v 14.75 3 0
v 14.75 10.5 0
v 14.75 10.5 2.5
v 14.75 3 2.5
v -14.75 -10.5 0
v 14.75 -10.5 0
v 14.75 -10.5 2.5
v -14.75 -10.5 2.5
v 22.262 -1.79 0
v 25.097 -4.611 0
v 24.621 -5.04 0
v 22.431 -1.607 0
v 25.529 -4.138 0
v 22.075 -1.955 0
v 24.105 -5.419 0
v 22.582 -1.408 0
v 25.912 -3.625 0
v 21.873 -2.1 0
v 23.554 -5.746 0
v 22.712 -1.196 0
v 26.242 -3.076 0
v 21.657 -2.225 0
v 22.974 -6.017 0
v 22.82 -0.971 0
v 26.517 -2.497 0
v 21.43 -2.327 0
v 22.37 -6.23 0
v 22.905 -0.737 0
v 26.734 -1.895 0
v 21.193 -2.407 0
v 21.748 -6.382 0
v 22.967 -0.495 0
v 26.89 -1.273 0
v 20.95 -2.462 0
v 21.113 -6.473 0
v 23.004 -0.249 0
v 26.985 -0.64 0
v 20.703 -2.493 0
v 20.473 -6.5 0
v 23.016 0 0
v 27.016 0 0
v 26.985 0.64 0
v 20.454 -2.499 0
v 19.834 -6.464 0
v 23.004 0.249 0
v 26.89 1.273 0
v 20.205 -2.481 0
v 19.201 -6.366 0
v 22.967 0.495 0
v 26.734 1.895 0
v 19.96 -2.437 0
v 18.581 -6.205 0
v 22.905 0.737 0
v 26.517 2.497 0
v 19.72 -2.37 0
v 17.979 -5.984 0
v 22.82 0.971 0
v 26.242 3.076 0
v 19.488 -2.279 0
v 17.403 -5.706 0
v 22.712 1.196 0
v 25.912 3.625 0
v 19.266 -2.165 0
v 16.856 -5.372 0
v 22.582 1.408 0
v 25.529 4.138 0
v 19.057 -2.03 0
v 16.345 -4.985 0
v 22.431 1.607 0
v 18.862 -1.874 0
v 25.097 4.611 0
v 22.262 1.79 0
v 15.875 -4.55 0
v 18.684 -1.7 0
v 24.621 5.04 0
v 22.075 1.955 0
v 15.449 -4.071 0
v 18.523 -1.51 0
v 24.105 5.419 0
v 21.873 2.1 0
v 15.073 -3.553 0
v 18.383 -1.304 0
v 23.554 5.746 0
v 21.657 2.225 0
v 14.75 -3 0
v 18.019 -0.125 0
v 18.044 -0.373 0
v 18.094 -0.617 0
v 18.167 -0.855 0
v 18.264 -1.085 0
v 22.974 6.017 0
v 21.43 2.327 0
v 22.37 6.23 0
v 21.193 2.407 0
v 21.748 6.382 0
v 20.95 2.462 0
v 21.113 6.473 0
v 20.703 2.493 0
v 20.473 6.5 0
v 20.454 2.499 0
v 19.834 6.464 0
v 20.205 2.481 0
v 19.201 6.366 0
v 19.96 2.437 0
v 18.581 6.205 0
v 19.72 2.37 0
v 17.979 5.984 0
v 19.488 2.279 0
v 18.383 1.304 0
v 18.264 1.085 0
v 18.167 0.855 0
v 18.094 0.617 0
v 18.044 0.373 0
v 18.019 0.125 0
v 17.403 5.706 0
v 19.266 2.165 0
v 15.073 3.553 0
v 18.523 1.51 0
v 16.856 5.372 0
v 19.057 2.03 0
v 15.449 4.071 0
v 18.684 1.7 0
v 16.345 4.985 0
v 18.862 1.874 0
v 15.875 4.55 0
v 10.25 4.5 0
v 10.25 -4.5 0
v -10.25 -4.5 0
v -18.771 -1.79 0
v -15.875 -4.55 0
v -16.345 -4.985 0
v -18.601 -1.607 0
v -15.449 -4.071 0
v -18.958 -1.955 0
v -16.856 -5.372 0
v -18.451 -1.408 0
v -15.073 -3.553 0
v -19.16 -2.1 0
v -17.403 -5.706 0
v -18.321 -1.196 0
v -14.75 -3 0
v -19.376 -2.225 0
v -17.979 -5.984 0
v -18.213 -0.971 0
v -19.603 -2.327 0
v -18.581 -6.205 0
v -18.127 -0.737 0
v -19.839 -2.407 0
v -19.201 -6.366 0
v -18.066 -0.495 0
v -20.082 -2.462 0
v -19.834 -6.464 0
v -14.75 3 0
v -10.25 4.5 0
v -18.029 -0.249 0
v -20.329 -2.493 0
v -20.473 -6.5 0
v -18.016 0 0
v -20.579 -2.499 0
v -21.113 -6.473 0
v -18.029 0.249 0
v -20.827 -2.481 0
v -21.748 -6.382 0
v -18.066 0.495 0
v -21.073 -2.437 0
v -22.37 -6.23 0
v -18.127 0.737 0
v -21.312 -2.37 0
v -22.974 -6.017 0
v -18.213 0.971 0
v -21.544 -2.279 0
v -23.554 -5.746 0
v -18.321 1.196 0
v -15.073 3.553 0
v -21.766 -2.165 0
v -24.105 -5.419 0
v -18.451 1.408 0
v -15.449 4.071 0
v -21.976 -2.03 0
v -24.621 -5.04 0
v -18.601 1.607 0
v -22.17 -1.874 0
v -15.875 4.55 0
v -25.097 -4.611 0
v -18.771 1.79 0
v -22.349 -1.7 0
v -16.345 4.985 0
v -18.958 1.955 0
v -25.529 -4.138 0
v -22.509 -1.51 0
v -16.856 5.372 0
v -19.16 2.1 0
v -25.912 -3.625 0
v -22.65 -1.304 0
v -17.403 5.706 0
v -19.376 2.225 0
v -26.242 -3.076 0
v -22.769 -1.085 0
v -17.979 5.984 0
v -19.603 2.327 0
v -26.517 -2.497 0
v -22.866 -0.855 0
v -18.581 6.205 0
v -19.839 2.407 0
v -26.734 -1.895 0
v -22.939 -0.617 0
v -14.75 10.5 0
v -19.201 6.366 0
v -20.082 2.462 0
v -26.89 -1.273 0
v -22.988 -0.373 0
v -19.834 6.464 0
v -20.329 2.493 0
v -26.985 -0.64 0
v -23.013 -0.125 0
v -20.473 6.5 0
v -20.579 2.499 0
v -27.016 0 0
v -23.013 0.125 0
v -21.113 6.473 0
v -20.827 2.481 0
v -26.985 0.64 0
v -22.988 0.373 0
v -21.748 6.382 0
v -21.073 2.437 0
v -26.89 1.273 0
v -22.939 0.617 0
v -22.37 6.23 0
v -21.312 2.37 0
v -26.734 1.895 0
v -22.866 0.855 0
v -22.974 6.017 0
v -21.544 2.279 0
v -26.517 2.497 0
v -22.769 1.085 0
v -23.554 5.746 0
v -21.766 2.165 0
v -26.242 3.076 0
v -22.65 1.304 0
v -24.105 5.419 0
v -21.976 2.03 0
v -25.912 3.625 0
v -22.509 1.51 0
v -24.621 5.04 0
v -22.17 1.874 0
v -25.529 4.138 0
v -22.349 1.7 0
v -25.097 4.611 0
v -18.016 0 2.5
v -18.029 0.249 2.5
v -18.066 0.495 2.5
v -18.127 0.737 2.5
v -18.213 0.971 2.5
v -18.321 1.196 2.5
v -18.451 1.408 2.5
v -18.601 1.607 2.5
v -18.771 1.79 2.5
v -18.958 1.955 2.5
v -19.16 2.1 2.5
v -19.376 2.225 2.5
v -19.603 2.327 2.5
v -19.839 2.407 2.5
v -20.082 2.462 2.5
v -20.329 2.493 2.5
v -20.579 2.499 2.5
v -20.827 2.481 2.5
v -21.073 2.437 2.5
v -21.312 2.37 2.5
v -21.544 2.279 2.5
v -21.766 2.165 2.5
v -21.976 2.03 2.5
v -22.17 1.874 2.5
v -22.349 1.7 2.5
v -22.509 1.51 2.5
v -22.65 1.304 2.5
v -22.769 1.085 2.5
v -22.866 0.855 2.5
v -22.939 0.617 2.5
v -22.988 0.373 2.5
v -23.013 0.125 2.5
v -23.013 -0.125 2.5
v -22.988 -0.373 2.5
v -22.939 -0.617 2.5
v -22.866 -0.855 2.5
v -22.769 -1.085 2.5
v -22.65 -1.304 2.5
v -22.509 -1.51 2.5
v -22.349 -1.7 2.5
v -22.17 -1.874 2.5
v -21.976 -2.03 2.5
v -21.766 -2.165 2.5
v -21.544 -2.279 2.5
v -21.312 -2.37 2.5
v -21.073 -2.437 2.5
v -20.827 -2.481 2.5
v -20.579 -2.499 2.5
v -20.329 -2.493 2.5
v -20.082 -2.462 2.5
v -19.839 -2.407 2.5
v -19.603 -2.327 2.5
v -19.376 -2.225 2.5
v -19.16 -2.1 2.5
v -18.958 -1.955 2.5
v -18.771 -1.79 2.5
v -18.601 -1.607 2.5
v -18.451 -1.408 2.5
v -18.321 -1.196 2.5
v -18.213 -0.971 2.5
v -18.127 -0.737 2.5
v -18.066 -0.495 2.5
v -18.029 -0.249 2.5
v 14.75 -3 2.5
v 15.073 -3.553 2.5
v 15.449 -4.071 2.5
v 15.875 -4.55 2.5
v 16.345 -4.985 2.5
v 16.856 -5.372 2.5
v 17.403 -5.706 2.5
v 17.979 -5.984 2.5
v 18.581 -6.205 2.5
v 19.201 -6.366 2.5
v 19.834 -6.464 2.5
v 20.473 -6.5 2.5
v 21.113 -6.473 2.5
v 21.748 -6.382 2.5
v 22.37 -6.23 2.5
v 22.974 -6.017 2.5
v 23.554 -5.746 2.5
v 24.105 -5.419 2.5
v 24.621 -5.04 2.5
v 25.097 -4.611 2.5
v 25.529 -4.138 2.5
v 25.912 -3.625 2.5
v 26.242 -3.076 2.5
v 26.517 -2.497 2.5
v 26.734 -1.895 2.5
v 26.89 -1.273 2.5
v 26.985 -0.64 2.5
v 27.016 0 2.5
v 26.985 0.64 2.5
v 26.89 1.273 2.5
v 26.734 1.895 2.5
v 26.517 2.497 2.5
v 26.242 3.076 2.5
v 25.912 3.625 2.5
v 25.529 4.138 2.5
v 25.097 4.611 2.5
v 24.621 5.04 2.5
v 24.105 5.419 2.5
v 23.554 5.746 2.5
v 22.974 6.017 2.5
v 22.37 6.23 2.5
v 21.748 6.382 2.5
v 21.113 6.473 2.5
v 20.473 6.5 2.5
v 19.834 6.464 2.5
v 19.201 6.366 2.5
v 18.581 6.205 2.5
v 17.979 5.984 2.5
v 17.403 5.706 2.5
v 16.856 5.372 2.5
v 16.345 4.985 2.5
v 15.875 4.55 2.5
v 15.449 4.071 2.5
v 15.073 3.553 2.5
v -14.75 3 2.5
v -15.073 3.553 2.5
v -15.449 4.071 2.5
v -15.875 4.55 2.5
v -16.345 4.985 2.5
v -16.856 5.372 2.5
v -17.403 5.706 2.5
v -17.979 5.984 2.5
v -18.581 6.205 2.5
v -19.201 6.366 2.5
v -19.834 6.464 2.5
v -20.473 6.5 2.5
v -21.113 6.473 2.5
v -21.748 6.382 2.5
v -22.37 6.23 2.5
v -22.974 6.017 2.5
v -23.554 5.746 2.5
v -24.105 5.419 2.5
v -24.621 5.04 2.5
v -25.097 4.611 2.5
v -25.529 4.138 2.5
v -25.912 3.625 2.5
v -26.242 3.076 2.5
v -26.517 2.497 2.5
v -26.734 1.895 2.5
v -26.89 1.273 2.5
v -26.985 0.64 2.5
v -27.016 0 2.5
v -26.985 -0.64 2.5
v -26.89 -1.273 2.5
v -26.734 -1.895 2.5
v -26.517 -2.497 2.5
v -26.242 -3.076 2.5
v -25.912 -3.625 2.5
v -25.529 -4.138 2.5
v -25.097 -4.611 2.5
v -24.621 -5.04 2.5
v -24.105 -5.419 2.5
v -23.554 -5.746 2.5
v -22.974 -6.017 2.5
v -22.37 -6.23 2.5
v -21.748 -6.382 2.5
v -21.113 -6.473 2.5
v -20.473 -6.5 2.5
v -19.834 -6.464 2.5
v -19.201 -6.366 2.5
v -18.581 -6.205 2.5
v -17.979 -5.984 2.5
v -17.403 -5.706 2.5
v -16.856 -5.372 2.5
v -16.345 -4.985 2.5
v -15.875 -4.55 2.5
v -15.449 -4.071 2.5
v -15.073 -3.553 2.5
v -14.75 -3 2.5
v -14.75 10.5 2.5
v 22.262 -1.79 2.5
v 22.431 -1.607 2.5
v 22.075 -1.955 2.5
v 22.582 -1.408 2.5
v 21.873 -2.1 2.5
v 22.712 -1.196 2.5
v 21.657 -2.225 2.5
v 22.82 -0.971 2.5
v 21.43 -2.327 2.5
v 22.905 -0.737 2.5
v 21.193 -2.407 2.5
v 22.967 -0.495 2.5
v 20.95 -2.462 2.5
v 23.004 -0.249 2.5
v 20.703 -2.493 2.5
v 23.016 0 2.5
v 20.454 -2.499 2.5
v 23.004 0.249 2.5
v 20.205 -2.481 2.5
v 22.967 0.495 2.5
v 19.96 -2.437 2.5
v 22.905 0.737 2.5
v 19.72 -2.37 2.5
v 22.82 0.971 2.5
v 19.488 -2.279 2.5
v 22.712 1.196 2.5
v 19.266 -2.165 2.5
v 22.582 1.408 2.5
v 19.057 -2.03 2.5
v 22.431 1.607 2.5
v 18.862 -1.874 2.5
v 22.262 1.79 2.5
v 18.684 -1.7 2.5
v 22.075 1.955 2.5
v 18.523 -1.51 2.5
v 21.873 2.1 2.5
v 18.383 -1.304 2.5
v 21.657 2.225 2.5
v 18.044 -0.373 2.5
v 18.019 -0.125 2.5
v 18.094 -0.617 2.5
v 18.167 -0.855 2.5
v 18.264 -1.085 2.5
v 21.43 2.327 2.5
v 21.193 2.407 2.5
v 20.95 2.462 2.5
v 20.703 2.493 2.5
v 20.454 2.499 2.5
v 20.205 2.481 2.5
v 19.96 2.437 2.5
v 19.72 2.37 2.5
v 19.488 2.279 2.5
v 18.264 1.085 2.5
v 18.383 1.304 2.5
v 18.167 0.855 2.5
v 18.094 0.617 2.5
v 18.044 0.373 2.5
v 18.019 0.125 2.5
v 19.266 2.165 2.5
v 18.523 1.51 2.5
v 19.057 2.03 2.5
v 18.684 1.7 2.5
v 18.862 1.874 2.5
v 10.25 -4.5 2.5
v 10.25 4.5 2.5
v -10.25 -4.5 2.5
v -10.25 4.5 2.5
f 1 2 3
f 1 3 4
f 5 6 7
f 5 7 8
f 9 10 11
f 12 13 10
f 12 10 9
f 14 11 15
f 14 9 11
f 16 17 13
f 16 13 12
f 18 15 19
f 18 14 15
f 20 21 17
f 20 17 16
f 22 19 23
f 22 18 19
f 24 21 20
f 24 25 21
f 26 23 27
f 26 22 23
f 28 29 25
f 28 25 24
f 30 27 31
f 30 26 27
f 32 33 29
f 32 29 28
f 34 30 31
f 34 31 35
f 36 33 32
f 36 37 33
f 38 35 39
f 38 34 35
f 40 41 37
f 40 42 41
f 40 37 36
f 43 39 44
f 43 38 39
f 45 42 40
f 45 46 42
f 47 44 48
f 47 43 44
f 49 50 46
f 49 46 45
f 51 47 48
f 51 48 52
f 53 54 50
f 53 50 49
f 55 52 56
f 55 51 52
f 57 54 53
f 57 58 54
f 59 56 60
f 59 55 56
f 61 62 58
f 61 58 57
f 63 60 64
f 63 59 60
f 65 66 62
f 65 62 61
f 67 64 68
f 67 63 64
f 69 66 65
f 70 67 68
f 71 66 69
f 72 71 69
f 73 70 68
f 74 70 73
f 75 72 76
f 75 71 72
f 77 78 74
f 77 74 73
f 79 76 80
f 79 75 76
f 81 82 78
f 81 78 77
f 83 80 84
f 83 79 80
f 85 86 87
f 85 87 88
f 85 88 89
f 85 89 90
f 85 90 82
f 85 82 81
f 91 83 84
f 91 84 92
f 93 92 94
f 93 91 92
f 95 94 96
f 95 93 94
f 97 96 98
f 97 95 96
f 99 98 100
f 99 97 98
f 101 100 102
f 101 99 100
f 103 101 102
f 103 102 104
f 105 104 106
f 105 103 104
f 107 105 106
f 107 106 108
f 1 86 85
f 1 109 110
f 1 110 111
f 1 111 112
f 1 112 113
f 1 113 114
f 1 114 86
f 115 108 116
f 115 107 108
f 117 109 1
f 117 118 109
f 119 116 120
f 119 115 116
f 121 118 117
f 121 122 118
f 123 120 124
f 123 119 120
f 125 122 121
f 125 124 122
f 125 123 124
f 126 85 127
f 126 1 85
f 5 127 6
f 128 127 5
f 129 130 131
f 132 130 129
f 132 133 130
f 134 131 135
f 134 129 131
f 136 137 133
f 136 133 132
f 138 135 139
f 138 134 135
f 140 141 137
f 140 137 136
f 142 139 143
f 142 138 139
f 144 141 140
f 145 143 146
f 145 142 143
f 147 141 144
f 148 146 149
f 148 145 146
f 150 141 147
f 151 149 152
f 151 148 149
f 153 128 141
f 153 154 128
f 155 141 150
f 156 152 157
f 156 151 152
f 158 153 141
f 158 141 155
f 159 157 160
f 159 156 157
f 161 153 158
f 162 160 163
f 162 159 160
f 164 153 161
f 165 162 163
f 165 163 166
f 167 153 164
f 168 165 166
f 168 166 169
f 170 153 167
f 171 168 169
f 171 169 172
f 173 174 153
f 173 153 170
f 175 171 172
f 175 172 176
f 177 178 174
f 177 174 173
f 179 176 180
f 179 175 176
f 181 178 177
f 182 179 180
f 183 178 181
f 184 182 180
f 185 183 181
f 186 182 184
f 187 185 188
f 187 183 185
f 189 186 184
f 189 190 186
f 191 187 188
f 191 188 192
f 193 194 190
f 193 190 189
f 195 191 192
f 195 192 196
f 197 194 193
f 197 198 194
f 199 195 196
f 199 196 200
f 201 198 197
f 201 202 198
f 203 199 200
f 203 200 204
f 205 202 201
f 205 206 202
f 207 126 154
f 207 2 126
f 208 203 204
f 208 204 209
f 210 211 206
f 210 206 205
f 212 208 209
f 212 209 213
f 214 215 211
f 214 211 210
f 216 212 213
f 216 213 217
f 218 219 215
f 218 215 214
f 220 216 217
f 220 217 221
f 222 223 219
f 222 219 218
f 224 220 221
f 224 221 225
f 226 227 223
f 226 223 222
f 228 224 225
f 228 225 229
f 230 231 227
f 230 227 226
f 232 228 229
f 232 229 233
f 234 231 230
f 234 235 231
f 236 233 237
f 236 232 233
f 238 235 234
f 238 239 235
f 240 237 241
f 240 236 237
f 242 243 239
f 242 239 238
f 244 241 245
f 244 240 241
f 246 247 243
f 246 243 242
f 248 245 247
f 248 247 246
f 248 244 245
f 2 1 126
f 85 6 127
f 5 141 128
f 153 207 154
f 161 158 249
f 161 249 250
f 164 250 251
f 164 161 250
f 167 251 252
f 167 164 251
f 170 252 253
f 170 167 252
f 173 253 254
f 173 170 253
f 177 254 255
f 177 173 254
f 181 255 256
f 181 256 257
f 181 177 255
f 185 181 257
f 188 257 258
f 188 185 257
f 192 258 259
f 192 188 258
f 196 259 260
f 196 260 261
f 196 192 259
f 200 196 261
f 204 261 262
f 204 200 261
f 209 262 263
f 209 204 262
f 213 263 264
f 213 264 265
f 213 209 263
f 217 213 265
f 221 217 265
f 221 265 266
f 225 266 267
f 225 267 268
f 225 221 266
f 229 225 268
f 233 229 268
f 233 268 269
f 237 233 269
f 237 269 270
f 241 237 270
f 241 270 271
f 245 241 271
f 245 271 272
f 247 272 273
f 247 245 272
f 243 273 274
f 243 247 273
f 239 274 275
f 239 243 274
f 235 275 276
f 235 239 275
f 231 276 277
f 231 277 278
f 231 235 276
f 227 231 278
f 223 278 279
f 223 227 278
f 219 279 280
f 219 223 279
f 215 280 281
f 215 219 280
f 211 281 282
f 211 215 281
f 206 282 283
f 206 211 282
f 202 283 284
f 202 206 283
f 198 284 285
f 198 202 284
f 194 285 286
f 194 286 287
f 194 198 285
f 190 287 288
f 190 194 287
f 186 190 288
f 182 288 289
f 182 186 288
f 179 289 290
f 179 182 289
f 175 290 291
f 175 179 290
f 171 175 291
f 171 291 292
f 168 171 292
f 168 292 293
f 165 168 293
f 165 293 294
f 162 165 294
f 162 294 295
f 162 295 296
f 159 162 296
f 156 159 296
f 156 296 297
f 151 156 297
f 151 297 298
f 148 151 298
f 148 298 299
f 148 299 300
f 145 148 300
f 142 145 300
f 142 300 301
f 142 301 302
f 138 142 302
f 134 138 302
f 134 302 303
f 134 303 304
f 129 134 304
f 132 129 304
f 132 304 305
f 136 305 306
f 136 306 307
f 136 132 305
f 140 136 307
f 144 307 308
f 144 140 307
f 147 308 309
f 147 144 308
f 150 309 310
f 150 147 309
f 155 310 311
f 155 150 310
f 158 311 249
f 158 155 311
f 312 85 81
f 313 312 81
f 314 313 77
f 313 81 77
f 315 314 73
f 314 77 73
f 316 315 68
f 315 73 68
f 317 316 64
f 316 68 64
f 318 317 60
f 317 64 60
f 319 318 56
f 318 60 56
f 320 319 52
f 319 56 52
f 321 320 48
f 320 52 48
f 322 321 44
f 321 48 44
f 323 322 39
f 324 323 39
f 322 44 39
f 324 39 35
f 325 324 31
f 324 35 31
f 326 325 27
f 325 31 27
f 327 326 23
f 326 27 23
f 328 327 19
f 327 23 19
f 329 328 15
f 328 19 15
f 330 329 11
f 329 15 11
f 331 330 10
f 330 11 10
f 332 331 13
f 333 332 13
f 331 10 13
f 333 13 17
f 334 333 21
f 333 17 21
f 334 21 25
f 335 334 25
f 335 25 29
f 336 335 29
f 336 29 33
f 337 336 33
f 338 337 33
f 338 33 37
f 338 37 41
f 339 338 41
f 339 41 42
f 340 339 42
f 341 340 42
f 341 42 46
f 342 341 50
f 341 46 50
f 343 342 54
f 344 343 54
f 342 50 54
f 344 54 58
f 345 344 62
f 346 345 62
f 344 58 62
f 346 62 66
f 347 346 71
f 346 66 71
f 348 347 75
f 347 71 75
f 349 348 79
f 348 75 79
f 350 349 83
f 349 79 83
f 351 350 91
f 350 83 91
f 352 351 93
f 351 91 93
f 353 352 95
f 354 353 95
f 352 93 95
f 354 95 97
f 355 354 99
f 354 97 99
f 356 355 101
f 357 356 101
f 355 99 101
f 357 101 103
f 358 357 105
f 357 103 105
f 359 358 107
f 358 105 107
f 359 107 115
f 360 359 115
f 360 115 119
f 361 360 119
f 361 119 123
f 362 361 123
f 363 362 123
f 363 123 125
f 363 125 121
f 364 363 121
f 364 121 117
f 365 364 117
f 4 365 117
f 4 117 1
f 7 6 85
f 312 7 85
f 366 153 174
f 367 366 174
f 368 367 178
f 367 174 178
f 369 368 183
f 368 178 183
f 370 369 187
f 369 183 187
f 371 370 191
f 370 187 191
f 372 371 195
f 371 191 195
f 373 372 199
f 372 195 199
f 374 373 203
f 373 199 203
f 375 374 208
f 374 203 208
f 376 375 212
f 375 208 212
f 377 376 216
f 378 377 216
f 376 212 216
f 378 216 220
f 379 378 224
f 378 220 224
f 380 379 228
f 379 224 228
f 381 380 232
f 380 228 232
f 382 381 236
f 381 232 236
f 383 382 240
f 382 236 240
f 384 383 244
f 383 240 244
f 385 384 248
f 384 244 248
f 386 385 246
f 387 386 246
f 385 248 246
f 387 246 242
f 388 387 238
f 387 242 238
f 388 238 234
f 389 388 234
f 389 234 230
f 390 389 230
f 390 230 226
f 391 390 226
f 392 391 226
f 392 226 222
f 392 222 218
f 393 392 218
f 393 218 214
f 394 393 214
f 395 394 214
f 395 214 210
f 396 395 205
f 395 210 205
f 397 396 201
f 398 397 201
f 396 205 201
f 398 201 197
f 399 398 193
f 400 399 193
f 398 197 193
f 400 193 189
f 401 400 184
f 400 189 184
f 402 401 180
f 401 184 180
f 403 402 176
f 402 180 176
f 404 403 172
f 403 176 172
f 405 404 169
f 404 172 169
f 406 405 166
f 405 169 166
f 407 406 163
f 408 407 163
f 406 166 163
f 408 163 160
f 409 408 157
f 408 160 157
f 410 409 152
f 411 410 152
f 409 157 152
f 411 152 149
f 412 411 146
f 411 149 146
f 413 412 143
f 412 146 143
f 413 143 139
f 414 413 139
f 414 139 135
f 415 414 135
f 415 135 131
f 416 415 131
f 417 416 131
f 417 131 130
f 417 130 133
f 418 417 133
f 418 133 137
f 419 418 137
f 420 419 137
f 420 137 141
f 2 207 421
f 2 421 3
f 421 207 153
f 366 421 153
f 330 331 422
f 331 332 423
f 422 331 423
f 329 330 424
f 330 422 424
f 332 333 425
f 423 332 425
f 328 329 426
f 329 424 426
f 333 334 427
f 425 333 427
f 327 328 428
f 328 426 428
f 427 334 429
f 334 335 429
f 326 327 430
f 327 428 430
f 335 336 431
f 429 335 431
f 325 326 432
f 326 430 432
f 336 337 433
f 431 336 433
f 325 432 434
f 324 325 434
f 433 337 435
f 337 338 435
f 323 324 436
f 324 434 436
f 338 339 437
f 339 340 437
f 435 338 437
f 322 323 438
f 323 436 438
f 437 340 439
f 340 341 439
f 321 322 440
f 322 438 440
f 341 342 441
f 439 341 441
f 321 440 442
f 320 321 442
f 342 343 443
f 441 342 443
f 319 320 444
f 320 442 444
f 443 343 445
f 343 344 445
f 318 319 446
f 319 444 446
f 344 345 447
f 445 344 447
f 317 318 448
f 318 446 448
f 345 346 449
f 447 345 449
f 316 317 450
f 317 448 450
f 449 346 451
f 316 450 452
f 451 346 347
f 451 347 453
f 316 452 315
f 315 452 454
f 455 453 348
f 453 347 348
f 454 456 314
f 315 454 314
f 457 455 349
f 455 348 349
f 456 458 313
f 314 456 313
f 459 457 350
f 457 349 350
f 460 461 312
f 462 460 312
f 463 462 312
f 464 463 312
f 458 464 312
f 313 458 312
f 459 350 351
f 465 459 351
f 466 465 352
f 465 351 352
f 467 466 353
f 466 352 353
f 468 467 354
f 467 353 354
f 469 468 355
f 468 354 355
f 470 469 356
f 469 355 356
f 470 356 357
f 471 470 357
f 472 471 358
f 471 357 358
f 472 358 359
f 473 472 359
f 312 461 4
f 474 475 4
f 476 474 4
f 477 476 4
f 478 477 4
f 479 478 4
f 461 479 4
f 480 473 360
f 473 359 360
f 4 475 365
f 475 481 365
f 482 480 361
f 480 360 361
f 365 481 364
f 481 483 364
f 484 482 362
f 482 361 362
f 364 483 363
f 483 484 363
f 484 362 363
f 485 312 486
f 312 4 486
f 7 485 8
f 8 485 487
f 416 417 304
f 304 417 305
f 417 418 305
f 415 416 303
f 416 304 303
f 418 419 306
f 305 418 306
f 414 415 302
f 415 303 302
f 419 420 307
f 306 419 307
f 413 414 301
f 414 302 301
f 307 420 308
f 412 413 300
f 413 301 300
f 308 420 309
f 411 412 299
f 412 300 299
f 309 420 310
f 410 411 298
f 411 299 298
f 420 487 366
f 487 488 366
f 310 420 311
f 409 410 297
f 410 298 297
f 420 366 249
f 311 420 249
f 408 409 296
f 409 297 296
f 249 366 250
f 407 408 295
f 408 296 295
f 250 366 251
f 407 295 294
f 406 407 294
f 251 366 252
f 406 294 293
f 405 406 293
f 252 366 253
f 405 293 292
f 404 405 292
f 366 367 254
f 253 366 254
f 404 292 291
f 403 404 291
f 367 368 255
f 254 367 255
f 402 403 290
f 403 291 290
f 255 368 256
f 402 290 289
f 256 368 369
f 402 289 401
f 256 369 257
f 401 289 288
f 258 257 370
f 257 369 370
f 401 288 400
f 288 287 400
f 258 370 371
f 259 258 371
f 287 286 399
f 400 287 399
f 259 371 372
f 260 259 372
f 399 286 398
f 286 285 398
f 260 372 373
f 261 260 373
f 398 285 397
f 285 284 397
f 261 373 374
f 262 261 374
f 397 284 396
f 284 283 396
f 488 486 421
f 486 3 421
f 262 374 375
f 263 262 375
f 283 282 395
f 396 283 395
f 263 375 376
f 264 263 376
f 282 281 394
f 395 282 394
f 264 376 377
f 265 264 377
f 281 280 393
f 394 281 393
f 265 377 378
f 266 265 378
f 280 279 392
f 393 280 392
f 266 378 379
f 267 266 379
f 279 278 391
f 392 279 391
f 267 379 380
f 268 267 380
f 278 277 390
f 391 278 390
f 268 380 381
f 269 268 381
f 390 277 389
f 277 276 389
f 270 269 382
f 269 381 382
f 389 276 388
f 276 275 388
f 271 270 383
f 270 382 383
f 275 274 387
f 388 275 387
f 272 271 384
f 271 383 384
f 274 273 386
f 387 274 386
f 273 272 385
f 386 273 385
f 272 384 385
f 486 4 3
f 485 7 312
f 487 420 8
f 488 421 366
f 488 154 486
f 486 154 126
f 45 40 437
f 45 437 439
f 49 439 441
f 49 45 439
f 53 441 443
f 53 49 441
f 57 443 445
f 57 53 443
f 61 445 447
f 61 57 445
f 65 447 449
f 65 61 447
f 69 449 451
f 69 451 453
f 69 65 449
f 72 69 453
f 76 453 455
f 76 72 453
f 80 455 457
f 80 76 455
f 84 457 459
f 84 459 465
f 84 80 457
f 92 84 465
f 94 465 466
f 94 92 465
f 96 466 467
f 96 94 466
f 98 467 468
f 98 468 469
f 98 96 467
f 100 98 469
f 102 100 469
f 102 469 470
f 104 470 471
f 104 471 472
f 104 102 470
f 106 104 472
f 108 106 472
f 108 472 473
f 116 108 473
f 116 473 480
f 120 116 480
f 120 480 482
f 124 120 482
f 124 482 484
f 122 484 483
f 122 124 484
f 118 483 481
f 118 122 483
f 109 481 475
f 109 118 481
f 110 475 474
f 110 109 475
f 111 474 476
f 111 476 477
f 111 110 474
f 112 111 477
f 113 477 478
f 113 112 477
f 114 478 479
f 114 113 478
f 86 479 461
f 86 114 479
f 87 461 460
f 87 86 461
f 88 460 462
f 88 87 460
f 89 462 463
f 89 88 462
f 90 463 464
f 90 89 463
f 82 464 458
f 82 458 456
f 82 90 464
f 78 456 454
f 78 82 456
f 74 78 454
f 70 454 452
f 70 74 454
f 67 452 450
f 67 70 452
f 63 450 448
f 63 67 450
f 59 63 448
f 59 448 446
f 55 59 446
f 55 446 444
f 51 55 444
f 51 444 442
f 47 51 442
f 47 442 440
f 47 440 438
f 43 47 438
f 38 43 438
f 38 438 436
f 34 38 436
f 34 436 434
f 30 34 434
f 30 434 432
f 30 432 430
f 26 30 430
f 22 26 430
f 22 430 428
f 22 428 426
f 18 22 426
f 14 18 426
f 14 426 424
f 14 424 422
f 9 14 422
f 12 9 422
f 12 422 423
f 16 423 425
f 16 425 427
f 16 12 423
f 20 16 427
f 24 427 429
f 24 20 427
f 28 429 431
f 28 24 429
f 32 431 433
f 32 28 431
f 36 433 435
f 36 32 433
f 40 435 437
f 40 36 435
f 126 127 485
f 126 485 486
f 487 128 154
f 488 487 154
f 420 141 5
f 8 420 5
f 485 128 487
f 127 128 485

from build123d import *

# Parameters (mm, degrees)
SKETCH_R  = 2.5
SKETCH_W  = 20.5
SKETCH_H  = 9
PAD_DEPTH = 2.5


with BuildPart() as part:
    # Sketch → Pad (new body)
    with BuildSketch(Plane.XY):
        with BuildLine():
            Line((-14.75, 10.5), (14.75, 10.5))
            Line((14.75, 10.5), (14.75, 3))
            ThreePointArc((14.75, -3), (27.016281, 0), (14.75, 3))
            Line((14.75, -10.5), (14.75, -3))
            Line((14.75, -10.5), (-14.75, -10.5))
            Line((-14.75, -3), (-14.75, -10.5))
            ThreePointArc((-14.75, 3), (-27.016281, 0), (-14.75, -3))
            Line((-14.75, 10.5), (-14.75, 3))
        make_face()
        with Locations((-20.516281, 0)):
            Circle(SKETCH_R, mode=Mode.SUBTRACT)
        with Locations((20.516281, 0)):
            Circle(SKETCH_R, mode=Mode.SUBTRACT)
        Rectangle(SKETCH_W, SKETCH_H, mode=Mode.SUBTRACT)
    extrude(amount=PAD_DEPTH)


solid = part.part
